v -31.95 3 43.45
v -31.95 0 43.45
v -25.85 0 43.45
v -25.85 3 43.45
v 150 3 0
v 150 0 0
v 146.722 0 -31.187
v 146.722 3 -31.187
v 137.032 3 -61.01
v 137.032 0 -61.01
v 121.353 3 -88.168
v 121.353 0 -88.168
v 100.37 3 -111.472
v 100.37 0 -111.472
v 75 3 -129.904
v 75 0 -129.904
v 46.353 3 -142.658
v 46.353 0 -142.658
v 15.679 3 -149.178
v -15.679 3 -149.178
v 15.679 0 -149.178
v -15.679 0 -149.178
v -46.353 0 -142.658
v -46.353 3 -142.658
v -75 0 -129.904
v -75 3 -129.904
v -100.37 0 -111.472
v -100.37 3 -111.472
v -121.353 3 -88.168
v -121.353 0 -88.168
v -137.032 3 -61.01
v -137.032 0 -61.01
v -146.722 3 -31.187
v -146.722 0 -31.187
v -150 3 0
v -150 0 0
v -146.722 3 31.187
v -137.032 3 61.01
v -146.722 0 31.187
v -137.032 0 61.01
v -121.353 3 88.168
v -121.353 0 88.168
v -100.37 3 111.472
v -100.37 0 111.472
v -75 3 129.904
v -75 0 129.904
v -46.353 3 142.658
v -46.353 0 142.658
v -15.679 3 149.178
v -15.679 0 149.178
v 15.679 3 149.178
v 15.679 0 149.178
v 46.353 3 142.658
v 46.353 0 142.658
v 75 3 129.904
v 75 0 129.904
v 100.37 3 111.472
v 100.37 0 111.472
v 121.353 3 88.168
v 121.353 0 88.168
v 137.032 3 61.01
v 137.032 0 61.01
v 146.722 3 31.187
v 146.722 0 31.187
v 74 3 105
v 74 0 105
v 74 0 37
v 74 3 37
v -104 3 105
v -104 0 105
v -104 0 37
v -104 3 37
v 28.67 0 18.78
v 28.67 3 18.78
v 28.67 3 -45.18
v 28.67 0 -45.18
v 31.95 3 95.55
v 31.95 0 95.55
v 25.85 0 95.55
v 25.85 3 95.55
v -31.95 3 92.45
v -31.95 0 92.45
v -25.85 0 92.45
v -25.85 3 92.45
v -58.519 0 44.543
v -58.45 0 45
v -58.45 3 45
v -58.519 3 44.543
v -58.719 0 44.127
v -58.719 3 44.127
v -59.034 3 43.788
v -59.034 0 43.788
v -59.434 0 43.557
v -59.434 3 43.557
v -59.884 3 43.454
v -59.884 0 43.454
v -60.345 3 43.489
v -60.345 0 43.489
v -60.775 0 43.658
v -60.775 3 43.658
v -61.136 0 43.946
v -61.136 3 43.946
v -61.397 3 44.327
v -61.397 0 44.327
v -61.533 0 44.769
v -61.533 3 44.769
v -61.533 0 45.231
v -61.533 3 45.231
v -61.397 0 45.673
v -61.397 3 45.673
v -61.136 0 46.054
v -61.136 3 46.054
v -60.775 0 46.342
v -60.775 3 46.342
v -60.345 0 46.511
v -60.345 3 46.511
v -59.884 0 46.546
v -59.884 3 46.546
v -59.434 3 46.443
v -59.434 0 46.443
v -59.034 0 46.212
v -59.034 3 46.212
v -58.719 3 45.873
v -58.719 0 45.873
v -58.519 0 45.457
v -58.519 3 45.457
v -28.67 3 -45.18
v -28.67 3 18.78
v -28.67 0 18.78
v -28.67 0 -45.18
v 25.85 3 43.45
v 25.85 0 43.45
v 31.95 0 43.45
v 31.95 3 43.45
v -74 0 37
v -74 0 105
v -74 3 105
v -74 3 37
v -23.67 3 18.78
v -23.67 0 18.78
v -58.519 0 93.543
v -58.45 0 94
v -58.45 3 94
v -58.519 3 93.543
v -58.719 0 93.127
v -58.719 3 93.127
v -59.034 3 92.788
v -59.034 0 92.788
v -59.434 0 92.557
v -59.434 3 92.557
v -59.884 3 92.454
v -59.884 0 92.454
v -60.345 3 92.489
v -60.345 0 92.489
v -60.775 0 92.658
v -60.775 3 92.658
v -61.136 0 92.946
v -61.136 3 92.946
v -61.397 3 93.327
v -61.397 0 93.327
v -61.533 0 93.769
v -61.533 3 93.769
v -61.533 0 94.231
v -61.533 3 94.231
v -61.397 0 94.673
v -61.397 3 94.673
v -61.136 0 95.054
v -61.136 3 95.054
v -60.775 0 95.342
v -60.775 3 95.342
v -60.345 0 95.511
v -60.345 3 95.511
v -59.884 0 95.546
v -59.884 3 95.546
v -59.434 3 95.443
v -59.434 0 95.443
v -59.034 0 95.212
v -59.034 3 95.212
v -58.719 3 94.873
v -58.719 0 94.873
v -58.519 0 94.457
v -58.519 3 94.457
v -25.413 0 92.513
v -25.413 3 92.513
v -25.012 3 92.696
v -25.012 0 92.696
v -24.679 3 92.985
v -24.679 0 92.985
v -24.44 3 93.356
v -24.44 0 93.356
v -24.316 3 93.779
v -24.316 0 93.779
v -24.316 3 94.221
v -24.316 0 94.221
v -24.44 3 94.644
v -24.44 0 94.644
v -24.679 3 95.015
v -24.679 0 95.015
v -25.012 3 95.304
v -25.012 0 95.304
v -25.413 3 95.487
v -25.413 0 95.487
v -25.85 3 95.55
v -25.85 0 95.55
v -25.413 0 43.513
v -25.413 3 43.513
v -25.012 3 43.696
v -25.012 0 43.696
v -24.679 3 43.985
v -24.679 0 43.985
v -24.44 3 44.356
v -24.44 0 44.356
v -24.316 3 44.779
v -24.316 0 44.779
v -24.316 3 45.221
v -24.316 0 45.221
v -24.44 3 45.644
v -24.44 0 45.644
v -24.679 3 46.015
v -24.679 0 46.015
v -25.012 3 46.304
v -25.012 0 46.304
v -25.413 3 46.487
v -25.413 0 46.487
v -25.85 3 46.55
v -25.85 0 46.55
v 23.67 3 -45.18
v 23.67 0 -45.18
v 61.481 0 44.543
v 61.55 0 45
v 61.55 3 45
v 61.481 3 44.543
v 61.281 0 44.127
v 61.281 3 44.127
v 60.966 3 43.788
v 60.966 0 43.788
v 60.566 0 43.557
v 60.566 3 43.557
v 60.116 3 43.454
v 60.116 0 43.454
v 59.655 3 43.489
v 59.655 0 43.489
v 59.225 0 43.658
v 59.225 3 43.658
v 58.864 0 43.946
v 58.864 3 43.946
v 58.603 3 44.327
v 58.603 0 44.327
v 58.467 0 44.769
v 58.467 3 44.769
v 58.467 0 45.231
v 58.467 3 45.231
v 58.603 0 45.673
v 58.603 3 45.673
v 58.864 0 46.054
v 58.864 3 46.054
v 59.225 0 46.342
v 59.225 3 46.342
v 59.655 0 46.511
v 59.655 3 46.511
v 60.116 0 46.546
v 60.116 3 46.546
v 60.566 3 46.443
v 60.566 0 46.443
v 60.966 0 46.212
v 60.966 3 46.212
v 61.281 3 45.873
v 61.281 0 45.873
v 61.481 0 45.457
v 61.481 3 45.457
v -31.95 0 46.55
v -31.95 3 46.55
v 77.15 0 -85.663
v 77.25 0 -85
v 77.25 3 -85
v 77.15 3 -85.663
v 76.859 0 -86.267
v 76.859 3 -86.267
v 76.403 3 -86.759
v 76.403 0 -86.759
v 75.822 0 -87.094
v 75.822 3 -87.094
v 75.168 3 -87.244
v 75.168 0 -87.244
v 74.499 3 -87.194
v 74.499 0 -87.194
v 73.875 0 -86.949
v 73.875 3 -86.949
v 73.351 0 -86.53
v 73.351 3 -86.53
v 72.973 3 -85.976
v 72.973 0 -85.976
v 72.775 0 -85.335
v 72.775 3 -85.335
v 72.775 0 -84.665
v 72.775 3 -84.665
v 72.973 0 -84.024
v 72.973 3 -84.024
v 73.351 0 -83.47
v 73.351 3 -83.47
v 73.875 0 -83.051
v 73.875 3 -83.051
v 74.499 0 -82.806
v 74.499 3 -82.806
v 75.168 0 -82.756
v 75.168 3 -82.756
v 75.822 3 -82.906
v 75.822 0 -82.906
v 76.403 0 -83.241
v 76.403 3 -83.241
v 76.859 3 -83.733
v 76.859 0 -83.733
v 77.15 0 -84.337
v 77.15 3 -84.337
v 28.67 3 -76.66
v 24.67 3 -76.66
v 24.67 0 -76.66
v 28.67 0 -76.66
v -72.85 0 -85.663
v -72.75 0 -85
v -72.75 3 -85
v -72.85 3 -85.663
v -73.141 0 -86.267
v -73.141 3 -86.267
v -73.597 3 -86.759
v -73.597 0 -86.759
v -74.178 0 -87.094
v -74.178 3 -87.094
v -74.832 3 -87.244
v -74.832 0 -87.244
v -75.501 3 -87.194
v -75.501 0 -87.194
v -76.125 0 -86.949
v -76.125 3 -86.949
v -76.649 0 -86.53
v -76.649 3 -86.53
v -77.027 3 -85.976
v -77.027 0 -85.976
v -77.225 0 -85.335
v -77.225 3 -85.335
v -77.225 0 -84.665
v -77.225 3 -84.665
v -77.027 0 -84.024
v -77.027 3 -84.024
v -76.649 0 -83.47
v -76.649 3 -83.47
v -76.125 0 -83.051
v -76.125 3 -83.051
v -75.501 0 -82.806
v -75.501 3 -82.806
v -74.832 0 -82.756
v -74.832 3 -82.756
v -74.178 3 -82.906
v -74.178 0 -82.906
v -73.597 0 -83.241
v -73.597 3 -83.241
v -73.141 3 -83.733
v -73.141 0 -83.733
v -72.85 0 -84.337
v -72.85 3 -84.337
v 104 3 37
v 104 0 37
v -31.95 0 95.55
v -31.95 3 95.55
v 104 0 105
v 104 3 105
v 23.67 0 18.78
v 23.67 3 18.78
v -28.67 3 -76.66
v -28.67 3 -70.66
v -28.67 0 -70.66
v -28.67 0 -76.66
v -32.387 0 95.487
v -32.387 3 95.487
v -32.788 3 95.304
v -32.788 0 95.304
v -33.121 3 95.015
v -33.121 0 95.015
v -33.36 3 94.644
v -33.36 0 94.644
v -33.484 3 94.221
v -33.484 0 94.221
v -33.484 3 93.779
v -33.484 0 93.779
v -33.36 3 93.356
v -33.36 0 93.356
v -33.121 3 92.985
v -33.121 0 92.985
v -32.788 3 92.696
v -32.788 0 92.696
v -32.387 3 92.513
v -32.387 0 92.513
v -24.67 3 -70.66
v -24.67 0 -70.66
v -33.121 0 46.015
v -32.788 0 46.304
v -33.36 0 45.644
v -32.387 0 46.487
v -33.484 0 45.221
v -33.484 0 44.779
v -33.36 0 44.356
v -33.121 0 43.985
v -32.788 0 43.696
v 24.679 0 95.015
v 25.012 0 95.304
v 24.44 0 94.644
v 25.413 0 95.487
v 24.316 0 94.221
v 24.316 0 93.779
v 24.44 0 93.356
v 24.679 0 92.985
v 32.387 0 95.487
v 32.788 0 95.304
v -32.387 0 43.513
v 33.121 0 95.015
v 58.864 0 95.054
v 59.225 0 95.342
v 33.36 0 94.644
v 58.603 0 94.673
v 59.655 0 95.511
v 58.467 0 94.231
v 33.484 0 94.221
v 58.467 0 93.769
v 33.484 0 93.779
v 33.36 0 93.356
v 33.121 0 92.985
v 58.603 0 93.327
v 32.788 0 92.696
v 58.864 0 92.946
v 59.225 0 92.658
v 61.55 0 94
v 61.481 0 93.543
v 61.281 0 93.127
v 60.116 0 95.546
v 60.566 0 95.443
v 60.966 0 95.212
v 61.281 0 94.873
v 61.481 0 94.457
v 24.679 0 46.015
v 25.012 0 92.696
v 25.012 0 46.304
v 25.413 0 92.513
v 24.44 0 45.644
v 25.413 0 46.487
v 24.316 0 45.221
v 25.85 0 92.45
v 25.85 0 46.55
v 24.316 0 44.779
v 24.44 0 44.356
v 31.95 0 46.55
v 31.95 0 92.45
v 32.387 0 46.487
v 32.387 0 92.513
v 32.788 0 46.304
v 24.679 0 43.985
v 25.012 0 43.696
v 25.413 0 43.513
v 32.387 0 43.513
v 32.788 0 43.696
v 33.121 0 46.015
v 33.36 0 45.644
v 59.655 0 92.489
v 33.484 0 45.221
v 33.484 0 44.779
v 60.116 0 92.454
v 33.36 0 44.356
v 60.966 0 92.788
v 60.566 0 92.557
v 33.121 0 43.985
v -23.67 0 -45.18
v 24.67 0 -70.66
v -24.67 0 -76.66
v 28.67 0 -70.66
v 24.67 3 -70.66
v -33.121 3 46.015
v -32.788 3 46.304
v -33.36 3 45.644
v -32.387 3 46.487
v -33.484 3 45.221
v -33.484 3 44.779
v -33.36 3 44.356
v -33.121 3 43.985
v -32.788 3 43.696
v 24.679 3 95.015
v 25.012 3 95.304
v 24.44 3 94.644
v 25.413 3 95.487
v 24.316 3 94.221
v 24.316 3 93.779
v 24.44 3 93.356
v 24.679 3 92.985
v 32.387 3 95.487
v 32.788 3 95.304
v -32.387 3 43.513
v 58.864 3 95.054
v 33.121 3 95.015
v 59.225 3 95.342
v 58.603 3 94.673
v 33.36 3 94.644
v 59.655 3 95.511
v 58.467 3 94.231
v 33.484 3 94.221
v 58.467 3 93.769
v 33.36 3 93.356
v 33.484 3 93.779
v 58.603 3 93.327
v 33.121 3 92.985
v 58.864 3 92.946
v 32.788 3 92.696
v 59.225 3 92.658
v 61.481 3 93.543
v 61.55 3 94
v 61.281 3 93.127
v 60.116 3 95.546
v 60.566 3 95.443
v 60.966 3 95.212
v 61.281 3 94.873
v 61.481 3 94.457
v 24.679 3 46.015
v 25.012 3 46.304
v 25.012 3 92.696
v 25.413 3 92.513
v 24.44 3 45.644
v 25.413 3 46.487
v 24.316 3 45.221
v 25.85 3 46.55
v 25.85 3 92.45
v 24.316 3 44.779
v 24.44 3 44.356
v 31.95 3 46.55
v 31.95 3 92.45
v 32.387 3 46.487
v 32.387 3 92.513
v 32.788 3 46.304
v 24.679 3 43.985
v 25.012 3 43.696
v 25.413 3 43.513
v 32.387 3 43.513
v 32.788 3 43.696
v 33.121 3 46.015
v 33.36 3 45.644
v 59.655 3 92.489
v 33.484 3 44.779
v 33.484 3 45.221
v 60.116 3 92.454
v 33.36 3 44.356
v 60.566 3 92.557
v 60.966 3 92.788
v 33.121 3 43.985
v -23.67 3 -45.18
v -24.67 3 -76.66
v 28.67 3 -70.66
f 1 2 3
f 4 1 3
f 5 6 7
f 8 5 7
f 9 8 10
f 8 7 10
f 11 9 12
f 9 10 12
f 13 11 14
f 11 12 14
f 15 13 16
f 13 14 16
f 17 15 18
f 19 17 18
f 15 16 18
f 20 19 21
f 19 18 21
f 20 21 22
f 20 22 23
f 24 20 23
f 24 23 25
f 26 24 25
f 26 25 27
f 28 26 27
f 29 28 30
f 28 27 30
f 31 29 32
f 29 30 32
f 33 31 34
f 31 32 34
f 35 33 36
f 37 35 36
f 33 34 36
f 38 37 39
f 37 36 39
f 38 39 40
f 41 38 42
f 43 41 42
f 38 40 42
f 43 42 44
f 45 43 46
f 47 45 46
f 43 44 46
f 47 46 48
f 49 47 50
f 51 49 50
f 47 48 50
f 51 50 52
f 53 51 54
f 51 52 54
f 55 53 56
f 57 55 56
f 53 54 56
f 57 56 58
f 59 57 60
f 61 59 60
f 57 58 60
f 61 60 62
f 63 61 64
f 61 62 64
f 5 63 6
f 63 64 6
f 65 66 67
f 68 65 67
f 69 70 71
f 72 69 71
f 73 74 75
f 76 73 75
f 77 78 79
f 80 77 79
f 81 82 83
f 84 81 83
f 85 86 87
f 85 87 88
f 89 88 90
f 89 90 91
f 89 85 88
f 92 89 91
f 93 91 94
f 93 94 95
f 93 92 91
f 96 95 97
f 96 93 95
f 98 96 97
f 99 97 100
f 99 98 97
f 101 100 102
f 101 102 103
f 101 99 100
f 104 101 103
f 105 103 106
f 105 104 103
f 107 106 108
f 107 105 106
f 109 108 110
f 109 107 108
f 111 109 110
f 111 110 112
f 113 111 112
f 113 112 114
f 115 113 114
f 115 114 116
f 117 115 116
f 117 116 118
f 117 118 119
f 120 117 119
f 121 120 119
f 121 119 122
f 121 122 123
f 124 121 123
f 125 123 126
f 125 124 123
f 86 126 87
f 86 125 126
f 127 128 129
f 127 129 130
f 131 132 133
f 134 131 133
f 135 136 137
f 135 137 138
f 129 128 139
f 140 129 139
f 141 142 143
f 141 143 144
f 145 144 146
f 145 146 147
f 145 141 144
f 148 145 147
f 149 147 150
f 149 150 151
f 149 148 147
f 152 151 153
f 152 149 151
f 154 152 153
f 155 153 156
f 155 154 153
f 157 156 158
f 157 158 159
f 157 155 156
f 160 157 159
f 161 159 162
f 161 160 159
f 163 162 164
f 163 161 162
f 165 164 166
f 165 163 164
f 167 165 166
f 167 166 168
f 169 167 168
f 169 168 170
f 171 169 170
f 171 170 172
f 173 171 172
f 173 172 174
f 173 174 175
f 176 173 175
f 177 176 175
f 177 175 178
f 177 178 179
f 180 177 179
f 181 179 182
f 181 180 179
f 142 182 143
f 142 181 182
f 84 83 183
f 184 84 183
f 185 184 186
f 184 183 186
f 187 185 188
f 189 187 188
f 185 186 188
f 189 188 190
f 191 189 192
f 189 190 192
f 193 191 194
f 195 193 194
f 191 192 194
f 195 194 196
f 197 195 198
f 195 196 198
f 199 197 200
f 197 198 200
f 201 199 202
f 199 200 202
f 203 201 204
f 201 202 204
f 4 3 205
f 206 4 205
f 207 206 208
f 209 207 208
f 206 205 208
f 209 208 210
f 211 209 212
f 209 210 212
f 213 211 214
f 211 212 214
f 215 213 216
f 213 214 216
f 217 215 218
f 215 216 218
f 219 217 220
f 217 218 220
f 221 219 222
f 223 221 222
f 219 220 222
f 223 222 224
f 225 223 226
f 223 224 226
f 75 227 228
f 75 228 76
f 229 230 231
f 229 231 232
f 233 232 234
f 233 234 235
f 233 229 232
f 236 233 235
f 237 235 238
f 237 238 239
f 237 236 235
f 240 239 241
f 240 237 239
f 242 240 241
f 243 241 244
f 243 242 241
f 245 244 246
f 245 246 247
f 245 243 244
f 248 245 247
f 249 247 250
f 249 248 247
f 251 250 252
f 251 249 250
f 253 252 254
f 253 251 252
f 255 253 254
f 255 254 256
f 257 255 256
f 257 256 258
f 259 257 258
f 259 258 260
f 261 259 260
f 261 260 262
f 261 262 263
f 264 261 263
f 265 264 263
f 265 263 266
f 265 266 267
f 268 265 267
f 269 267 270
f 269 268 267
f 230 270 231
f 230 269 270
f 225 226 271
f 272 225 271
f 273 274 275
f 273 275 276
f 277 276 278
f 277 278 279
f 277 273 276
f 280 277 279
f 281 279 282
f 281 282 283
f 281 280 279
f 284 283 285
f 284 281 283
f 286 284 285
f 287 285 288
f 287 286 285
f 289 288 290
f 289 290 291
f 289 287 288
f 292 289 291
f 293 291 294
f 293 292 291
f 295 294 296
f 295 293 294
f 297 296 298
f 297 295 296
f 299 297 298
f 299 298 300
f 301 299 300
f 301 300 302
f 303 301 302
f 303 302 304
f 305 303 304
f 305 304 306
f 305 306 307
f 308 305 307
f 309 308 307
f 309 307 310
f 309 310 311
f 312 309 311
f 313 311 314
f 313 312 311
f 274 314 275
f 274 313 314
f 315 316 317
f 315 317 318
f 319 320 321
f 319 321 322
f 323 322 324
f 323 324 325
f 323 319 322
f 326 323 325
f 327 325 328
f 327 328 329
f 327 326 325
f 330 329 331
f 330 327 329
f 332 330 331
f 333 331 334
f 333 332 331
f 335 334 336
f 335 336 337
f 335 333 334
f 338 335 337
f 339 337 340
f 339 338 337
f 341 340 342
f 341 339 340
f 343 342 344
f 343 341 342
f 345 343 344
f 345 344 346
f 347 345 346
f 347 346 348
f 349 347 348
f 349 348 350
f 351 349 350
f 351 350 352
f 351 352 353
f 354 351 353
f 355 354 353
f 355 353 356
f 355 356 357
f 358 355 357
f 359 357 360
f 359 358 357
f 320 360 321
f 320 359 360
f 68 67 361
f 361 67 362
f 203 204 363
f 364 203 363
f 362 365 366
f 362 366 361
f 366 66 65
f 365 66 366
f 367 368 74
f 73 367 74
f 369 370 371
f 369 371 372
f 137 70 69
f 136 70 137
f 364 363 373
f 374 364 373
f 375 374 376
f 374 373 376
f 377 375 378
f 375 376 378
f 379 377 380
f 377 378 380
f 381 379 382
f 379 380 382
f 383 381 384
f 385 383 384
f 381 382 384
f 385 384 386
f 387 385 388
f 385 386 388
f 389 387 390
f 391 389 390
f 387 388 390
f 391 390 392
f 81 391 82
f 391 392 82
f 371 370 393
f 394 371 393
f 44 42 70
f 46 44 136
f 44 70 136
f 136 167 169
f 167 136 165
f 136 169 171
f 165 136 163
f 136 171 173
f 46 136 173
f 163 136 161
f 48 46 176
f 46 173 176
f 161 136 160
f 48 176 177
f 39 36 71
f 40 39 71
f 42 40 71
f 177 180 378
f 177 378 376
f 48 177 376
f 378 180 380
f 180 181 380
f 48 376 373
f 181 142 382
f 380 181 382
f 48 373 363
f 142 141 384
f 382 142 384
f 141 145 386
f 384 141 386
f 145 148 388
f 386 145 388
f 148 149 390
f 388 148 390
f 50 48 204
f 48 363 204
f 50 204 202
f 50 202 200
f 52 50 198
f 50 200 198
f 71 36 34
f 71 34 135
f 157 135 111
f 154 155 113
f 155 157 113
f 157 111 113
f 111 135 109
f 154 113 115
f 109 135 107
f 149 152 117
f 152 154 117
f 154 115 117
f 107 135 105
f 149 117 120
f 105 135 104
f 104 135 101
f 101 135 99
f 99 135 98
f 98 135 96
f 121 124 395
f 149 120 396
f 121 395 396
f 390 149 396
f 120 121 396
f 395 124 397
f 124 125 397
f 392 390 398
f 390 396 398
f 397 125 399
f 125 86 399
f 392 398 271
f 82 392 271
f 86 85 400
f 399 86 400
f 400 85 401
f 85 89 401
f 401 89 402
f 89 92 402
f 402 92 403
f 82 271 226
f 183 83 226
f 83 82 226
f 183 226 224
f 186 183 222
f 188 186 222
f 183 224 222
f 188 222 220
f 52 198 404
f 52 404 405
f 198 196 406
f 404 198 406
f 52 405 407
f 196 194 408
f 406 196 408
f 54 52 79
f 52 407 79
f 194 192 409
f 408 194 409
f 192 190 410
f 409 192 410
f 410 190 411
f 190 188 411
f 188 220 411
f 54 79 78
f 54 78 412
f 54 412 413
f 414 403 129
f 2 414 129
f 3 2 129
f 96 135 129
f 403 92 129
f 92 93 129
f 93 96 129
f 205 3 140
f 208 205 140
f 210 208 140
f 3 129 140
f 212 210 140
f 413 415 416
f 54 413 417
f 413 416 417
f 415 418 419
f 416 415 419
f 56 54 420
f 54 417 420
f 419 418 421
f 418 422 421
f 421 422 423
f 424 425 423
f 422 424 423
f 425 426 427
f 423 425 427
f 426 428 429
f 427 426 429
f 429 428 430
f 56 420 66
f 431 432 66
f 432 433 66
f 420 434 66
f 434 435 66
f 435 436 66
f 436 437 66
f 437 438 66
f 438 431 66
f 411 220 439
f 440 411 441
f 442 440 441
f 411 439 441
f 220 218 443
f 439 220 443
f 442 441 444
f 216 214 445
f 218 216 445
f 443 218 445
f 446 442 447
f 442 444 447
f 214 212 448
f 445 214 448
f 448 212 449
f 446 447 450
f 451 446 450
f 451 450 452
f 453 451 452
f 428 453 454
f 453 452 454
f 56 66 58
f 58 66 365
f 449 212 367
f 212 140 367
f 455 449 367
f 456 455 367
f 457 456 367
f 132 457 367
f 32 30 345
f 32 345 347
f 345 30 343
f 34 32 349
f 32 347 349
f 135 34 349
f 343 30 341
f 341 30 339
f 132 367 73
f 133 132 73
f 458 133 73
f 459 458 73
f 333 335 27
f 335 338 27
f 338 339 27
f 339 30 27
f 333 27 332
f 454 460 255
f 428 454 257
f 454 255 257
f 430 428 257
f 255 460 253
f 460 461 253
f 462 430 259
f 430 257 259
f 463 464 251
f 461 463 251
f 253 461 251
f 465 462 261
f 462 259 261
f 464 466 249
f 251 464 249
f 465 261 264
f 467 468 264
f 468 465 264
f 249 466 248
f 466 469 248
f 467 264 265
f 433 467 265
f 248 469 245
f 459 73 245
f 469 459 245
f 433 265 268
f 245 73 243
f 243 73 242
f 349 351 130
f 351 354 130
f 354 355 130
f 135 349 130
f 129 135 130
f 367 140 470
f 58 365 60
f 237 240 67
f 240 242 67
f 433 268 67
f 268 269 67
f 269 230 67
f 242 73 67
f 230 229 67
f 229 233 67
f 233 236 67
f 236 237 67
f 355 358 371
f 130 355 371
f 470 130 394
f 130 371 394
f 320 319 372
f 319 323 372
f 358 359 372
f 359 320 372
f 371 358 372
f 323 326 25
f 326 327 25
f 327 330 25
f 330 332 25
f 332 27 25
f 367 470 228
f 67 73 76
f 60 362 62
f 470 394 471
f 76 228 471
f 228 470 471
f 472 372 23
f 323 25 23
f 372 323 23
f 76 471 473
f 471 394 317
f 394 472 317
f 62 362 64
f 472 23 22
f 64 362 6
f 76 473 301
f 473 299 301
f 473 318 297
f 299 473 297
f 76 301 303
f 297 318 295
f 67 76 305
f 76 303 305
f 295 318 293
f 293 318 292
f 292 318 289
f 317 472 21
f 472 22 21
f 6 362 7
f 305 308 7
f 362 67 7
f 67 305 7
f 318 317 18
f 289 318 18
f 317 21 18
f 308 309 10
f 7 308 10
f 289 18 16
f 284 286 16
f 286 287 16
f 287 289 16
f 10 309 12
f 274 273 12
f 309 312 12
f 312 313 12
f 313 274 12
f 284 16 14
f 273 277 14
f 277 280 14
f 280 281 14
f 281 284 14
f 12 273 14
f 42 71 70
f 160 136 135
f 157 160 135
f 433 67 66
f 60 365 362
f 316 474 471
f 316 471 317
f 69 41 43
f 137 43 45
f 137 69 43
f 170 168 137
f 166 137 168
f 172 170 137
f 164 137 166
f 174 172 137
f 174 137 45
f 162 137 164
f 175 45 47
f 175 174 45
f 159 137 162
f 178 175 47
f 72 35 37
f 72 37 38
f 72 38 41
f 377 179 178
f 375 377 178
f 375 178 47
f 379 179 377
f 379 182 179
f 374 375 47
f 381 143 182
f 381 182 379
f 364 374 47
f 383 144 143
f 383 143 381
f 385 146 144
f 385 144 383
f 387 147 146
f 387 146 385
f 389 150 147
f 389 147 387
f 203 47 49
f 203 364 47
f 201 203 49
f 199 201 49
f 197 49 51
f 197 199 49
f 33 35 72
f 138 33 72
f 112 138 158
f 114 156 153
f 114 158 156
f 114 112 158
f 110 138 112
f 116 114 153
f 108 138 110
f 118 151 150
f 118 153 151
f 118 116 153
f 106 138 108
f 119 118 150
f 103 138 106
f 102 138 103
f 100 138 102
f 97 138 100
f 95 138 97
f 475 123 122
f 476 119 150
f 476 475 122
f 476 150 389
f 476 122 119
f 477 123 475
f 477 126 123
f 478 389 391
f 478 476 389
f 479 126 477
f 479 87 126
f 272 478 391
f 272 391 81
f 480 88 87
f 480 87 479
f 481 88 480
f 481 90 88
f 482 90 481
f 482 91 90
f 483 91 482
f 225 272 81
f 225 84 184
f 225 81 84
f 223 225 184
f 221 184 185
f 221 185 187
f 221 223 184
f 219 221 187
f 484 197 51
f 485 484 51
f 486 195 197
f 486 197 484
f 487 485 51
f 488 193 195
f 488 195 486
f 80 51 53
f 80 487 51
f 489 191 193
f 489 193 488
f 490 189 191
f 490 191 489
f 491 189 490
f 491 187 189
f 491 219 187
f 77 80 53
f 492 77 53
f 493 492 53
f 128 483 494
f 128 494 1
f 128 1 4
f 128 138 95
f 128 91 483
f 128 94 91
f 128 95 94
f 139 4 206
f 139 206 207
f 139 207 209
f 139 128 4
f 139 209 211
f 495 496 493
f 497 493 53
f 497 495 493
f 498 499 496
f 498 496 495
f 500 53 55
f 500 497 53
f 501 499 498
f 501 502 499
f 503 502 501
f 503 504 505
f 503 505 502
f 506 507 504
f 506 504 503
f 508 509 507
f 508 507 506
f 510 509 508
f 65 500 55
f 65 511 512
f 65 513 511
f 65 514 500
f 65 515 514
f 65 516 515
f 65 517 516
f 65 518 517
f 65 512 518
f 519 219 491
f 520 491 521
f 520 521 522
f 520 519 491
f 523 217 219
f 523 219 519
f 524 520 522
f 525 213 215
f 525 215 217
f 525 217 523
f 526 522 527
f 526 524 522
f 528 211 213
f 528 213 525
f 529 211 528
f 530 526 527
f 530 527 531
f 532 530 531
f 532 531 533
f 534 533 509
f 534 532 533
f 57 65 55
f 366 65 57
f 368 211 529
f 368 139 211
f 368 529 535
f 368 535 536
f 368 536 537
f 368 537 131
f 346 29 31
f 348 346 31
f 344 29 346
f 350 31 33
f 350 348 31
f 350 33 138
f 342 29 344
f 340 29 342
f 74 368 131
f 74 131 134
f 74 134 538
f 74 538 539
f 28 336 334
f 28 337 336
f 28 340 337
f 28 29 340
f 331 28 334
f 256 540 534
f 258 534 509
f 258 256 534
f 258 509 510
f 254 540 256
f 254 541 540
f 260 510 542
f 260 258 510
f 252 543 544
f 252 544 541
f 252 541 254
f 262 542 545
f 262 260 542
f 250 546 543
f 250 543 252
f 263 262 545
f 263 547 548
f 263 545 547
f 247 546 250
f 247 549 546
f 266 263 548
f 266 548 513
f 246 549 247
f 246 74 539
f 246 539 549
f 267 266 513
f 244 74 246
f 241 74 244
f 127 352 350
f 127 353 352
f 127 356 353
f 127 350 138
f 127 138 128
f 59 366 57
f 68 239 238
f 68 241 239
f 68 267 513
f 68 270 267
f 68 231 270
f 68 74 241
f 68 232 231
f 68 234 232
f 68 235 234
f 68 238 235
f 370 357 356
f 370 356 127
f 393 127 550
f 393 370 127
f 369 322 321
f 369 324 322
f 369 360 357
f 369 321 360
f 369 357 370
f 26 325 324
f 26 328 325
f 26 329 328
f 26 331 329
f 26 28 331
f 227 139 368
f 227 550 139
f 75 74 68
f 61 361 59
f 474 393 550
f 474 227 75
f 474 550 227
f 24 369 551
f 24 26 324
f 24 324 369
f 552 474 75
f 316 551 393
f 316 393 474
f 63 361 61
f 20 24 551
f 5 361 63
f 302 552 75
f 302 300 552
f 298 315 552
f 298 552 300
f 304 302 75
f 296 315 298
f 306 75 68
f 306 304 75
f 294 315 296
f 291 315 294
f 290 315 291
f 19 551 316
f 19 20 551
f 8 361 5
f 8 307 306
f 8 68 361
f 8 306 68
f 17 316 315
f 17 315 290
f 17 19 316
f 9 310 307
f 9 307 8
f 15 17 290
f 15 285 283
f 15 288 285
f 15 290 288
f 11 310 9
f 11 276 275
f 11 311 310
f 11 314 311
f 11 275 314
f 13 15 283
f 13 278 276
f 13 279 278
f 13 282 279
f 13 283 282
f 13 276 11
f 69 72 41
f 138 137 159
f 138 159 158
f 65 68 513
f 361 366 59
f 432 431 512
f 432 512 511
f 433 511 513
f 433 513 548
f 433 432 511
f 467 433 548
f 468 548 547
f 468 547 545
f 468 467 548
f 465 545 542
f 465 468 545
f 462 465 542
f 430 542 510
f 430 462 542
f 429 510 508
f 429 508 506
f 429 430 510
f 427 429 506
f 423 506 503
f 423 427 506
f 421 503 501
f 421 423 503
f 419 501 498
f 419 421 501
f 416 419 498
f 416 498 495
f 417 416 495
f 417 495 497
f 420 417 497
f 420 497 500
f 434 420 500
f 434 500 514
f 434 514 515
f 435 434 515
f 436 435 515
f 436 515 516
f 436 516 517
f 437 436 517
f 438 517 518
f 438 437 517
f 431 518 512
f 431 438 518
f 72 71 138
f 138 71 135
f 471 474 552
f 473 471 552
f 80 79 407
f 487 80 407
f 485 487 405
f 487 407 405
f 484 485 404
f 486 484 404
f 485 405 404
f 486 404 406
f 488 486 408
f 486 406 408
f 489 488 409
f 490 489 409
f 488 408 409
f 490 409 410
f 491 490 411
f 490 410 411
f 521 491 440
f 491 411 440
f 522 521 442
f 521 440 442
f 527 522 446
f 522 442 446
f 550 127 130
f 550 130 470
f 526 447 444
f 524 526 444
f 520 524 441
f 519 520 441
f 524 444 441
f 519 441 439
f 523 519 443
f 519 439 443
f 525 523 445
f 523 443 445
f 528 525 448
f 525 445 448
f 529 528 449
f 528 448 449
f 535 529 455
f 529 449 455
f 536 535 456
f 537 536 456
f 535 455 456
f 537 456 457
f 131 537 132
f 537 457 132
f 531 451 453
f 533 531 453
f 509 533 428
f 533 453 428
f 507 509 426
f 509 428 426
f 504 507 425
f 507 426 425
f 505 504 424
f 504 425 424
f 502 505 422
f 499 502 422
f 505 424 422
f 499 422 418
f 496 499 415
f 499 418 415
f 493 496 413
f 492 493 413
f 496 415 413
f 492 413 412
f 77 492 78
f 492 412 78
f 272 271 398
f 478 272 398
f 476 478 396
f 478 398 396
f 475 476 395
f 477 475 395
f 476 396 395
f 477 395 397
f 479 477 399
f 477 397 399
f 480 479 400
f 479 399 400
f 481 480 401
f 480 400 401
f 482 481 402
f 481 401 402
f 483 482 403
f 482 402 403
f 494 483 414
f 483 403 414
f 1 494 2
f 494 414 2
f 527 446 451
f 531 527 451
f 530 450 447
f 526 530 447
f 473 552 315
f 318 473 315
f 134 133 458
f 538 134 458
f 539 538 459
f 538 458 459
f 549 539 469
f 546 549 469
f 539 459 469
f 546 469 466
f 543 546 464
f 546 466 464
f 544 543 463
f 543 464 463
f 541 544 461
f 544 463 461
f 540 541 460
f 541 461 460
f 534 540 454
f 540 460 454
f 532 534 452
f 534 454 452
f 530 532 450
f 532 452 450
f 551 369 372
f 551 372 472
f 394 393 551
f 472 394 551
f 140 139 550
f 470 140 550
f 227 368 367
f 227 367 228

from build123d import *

# Parameters (mm, degrees)
BOSS_EXTRUDE1_OUTLINE_R   = 150
BOSS_EXTRUDE1_OUTLINE_R_2 = 1.55
BOSS_EXTRUDE1_OUTLINE_W   = 30
BOSS_EXTRUDE1_OUTLINE_H   = 68
BOSS_EXTRUDE1_OUTLINE_R_3 = 2.25
BOSS_EXTRUDE1_DEPTH       = 3
SKETCH3_W                 = 5
SKETCH3_H                 = 63.96
SKETCH3_W_2               = 4
SKETCH3_H_2               = 6
CUT_EXTRUDE1_DEPTH        = 10


# Read off the part's stored shape, not the designer's step: Boss-Extrude1
with BuildPart() as part:
    # Boss-Extrude1 outline → Boss-Extrude1 (new body)
    with BuildSketch(Plane(origin=(0, 0, 0), x_dir=(1, 0, 0), z_dir=(0, 1, 0))):
        Circle(BOSS_EXTRUDE1_OUTLINE_R)
        with Locations((-60, -94)):
            Circle(BOSS_EXTRUDE1_OUTLINE_R_2, mode=Mode.SUBTRACT)
        with BuildLine():
            Line((-25.85, -95.55), (-31.95, -95.55))
            ThreePointArc((-31.95, -95.55), (-33.5, -94), (-31.95, -92.45))
            Line((-31.95, -92.45), (-25.85, -92.45))
            ThreePointArc((-25.85, -92.45), (-24.3, -94), (-25.85, -95.55))
        make_face(mode=Mode.SUBTRACT)
        with Locations((-89, -71)):
            Rectangle(BOSS_EXTRUDE1_OUTLINE_W, BOSS_EXTRUDE1_OUTLINE_H, mode=Mode.SUBTRACT)
        with Locations((-60, -45)):
            Circle(BOSS_EXTRUDE1_OUTLINE_R_2, mode=Mode.SUBTRACT)
        with BuildLine():
            Line((-25.85, -46.55), (-31.95, -46.55))
            ThreePointArc((-31.95, -46.55), (-33.5, -45), (-31.95, -43.45))
            Line((-31.95, -43.45), (-25.85, -43.45))
            ThreePointArc((-25.85, -43.45), (-24.3, -45), (-25.85, -46.55))
        make_face(mode=Mode.SUBTRACT)
        with BuildLine():
            Line((25.85, -92.45), (31.95, -92.45))
            ThreePointArc((31.95, -92.45), (33.5, -94), (31.95, -95.55))
            Line((31.95, -95.55), (25.85, -95.55))
            ThreePointArc((25.85, -95.55), (24.3, -94), (25.85, -92.45))
        make_face(mode=Mode.SUBTRACT)
        with Locations((60, -94)):
            Circle(BOSS_EXTRUDE1_OUTLINE_R_2, mode=Mode.SUBTRACT)
        with BuildLine():
            Line((25.85, -43.45), (31.95, -43.45))
            ThreePointArc((31.95, -43.45), (33.5, -45), (31.95, -46.55))
            Line((31.95, -46.55), (25.85, -46.55))
            ThreePointArc((25.85, -46.55), (24.3, -45), (25.85, -43.45))
        make_face(mode=Mode.SUBTRACT)
        with Locations((60, -45)):
            Circle(BOSS_EXTRUDE1_OUTLINE_R_2, mode=Mode.SUBTRACT)
        with Locations((89, -71)):
            Rectangle(BOSS_EXTRUDE1_OUTLINE_W, BOSS_EXTRUDE1_OUTLINE_H, mode=Mode.SUBTRACT)
        with Locations((-75, 85)):
            Circle(BOSS_EXTRUDE1_OUTLINE_R_3, mode=Mode.SUBTRACT)
        with Locations((75, 85)):
            Circle(BOSS_EXTRUDE1_OUTLINE_R_3, mode=Mode.SUBTRACT)
    extrude(amount=BOSS_EXTRUDE1_DEPTH)

    # Sketch3 → Cut-Extrude1 (cut)
    with BuildSketch(Plane(origin=(0, 3, 0), x_dir=(1, 0, 0), z_dir=(0, 1, 0))):
        with Locations((-26.17, 13.2)):
            Rectangle(SKETCH3_W, SKETCH3_H)
        with Locations((-26.67, 73.66)):
            Rectangle(SKETCH3_W_2, SKETCH3_H_2)
        with Locations((26.67, 73.66)):
            Rectangle(SKETCH3_W_2, SKETCH3_H_2)
        with Locations((26.17, 13.2)):
            Rectangle(SKETCH3_W, SKETCH3_H)
    extrude(amount=-CUT_EXTRUDE1_DEPTH, mode=Mode.SUBTRACT)


solid = part.part
